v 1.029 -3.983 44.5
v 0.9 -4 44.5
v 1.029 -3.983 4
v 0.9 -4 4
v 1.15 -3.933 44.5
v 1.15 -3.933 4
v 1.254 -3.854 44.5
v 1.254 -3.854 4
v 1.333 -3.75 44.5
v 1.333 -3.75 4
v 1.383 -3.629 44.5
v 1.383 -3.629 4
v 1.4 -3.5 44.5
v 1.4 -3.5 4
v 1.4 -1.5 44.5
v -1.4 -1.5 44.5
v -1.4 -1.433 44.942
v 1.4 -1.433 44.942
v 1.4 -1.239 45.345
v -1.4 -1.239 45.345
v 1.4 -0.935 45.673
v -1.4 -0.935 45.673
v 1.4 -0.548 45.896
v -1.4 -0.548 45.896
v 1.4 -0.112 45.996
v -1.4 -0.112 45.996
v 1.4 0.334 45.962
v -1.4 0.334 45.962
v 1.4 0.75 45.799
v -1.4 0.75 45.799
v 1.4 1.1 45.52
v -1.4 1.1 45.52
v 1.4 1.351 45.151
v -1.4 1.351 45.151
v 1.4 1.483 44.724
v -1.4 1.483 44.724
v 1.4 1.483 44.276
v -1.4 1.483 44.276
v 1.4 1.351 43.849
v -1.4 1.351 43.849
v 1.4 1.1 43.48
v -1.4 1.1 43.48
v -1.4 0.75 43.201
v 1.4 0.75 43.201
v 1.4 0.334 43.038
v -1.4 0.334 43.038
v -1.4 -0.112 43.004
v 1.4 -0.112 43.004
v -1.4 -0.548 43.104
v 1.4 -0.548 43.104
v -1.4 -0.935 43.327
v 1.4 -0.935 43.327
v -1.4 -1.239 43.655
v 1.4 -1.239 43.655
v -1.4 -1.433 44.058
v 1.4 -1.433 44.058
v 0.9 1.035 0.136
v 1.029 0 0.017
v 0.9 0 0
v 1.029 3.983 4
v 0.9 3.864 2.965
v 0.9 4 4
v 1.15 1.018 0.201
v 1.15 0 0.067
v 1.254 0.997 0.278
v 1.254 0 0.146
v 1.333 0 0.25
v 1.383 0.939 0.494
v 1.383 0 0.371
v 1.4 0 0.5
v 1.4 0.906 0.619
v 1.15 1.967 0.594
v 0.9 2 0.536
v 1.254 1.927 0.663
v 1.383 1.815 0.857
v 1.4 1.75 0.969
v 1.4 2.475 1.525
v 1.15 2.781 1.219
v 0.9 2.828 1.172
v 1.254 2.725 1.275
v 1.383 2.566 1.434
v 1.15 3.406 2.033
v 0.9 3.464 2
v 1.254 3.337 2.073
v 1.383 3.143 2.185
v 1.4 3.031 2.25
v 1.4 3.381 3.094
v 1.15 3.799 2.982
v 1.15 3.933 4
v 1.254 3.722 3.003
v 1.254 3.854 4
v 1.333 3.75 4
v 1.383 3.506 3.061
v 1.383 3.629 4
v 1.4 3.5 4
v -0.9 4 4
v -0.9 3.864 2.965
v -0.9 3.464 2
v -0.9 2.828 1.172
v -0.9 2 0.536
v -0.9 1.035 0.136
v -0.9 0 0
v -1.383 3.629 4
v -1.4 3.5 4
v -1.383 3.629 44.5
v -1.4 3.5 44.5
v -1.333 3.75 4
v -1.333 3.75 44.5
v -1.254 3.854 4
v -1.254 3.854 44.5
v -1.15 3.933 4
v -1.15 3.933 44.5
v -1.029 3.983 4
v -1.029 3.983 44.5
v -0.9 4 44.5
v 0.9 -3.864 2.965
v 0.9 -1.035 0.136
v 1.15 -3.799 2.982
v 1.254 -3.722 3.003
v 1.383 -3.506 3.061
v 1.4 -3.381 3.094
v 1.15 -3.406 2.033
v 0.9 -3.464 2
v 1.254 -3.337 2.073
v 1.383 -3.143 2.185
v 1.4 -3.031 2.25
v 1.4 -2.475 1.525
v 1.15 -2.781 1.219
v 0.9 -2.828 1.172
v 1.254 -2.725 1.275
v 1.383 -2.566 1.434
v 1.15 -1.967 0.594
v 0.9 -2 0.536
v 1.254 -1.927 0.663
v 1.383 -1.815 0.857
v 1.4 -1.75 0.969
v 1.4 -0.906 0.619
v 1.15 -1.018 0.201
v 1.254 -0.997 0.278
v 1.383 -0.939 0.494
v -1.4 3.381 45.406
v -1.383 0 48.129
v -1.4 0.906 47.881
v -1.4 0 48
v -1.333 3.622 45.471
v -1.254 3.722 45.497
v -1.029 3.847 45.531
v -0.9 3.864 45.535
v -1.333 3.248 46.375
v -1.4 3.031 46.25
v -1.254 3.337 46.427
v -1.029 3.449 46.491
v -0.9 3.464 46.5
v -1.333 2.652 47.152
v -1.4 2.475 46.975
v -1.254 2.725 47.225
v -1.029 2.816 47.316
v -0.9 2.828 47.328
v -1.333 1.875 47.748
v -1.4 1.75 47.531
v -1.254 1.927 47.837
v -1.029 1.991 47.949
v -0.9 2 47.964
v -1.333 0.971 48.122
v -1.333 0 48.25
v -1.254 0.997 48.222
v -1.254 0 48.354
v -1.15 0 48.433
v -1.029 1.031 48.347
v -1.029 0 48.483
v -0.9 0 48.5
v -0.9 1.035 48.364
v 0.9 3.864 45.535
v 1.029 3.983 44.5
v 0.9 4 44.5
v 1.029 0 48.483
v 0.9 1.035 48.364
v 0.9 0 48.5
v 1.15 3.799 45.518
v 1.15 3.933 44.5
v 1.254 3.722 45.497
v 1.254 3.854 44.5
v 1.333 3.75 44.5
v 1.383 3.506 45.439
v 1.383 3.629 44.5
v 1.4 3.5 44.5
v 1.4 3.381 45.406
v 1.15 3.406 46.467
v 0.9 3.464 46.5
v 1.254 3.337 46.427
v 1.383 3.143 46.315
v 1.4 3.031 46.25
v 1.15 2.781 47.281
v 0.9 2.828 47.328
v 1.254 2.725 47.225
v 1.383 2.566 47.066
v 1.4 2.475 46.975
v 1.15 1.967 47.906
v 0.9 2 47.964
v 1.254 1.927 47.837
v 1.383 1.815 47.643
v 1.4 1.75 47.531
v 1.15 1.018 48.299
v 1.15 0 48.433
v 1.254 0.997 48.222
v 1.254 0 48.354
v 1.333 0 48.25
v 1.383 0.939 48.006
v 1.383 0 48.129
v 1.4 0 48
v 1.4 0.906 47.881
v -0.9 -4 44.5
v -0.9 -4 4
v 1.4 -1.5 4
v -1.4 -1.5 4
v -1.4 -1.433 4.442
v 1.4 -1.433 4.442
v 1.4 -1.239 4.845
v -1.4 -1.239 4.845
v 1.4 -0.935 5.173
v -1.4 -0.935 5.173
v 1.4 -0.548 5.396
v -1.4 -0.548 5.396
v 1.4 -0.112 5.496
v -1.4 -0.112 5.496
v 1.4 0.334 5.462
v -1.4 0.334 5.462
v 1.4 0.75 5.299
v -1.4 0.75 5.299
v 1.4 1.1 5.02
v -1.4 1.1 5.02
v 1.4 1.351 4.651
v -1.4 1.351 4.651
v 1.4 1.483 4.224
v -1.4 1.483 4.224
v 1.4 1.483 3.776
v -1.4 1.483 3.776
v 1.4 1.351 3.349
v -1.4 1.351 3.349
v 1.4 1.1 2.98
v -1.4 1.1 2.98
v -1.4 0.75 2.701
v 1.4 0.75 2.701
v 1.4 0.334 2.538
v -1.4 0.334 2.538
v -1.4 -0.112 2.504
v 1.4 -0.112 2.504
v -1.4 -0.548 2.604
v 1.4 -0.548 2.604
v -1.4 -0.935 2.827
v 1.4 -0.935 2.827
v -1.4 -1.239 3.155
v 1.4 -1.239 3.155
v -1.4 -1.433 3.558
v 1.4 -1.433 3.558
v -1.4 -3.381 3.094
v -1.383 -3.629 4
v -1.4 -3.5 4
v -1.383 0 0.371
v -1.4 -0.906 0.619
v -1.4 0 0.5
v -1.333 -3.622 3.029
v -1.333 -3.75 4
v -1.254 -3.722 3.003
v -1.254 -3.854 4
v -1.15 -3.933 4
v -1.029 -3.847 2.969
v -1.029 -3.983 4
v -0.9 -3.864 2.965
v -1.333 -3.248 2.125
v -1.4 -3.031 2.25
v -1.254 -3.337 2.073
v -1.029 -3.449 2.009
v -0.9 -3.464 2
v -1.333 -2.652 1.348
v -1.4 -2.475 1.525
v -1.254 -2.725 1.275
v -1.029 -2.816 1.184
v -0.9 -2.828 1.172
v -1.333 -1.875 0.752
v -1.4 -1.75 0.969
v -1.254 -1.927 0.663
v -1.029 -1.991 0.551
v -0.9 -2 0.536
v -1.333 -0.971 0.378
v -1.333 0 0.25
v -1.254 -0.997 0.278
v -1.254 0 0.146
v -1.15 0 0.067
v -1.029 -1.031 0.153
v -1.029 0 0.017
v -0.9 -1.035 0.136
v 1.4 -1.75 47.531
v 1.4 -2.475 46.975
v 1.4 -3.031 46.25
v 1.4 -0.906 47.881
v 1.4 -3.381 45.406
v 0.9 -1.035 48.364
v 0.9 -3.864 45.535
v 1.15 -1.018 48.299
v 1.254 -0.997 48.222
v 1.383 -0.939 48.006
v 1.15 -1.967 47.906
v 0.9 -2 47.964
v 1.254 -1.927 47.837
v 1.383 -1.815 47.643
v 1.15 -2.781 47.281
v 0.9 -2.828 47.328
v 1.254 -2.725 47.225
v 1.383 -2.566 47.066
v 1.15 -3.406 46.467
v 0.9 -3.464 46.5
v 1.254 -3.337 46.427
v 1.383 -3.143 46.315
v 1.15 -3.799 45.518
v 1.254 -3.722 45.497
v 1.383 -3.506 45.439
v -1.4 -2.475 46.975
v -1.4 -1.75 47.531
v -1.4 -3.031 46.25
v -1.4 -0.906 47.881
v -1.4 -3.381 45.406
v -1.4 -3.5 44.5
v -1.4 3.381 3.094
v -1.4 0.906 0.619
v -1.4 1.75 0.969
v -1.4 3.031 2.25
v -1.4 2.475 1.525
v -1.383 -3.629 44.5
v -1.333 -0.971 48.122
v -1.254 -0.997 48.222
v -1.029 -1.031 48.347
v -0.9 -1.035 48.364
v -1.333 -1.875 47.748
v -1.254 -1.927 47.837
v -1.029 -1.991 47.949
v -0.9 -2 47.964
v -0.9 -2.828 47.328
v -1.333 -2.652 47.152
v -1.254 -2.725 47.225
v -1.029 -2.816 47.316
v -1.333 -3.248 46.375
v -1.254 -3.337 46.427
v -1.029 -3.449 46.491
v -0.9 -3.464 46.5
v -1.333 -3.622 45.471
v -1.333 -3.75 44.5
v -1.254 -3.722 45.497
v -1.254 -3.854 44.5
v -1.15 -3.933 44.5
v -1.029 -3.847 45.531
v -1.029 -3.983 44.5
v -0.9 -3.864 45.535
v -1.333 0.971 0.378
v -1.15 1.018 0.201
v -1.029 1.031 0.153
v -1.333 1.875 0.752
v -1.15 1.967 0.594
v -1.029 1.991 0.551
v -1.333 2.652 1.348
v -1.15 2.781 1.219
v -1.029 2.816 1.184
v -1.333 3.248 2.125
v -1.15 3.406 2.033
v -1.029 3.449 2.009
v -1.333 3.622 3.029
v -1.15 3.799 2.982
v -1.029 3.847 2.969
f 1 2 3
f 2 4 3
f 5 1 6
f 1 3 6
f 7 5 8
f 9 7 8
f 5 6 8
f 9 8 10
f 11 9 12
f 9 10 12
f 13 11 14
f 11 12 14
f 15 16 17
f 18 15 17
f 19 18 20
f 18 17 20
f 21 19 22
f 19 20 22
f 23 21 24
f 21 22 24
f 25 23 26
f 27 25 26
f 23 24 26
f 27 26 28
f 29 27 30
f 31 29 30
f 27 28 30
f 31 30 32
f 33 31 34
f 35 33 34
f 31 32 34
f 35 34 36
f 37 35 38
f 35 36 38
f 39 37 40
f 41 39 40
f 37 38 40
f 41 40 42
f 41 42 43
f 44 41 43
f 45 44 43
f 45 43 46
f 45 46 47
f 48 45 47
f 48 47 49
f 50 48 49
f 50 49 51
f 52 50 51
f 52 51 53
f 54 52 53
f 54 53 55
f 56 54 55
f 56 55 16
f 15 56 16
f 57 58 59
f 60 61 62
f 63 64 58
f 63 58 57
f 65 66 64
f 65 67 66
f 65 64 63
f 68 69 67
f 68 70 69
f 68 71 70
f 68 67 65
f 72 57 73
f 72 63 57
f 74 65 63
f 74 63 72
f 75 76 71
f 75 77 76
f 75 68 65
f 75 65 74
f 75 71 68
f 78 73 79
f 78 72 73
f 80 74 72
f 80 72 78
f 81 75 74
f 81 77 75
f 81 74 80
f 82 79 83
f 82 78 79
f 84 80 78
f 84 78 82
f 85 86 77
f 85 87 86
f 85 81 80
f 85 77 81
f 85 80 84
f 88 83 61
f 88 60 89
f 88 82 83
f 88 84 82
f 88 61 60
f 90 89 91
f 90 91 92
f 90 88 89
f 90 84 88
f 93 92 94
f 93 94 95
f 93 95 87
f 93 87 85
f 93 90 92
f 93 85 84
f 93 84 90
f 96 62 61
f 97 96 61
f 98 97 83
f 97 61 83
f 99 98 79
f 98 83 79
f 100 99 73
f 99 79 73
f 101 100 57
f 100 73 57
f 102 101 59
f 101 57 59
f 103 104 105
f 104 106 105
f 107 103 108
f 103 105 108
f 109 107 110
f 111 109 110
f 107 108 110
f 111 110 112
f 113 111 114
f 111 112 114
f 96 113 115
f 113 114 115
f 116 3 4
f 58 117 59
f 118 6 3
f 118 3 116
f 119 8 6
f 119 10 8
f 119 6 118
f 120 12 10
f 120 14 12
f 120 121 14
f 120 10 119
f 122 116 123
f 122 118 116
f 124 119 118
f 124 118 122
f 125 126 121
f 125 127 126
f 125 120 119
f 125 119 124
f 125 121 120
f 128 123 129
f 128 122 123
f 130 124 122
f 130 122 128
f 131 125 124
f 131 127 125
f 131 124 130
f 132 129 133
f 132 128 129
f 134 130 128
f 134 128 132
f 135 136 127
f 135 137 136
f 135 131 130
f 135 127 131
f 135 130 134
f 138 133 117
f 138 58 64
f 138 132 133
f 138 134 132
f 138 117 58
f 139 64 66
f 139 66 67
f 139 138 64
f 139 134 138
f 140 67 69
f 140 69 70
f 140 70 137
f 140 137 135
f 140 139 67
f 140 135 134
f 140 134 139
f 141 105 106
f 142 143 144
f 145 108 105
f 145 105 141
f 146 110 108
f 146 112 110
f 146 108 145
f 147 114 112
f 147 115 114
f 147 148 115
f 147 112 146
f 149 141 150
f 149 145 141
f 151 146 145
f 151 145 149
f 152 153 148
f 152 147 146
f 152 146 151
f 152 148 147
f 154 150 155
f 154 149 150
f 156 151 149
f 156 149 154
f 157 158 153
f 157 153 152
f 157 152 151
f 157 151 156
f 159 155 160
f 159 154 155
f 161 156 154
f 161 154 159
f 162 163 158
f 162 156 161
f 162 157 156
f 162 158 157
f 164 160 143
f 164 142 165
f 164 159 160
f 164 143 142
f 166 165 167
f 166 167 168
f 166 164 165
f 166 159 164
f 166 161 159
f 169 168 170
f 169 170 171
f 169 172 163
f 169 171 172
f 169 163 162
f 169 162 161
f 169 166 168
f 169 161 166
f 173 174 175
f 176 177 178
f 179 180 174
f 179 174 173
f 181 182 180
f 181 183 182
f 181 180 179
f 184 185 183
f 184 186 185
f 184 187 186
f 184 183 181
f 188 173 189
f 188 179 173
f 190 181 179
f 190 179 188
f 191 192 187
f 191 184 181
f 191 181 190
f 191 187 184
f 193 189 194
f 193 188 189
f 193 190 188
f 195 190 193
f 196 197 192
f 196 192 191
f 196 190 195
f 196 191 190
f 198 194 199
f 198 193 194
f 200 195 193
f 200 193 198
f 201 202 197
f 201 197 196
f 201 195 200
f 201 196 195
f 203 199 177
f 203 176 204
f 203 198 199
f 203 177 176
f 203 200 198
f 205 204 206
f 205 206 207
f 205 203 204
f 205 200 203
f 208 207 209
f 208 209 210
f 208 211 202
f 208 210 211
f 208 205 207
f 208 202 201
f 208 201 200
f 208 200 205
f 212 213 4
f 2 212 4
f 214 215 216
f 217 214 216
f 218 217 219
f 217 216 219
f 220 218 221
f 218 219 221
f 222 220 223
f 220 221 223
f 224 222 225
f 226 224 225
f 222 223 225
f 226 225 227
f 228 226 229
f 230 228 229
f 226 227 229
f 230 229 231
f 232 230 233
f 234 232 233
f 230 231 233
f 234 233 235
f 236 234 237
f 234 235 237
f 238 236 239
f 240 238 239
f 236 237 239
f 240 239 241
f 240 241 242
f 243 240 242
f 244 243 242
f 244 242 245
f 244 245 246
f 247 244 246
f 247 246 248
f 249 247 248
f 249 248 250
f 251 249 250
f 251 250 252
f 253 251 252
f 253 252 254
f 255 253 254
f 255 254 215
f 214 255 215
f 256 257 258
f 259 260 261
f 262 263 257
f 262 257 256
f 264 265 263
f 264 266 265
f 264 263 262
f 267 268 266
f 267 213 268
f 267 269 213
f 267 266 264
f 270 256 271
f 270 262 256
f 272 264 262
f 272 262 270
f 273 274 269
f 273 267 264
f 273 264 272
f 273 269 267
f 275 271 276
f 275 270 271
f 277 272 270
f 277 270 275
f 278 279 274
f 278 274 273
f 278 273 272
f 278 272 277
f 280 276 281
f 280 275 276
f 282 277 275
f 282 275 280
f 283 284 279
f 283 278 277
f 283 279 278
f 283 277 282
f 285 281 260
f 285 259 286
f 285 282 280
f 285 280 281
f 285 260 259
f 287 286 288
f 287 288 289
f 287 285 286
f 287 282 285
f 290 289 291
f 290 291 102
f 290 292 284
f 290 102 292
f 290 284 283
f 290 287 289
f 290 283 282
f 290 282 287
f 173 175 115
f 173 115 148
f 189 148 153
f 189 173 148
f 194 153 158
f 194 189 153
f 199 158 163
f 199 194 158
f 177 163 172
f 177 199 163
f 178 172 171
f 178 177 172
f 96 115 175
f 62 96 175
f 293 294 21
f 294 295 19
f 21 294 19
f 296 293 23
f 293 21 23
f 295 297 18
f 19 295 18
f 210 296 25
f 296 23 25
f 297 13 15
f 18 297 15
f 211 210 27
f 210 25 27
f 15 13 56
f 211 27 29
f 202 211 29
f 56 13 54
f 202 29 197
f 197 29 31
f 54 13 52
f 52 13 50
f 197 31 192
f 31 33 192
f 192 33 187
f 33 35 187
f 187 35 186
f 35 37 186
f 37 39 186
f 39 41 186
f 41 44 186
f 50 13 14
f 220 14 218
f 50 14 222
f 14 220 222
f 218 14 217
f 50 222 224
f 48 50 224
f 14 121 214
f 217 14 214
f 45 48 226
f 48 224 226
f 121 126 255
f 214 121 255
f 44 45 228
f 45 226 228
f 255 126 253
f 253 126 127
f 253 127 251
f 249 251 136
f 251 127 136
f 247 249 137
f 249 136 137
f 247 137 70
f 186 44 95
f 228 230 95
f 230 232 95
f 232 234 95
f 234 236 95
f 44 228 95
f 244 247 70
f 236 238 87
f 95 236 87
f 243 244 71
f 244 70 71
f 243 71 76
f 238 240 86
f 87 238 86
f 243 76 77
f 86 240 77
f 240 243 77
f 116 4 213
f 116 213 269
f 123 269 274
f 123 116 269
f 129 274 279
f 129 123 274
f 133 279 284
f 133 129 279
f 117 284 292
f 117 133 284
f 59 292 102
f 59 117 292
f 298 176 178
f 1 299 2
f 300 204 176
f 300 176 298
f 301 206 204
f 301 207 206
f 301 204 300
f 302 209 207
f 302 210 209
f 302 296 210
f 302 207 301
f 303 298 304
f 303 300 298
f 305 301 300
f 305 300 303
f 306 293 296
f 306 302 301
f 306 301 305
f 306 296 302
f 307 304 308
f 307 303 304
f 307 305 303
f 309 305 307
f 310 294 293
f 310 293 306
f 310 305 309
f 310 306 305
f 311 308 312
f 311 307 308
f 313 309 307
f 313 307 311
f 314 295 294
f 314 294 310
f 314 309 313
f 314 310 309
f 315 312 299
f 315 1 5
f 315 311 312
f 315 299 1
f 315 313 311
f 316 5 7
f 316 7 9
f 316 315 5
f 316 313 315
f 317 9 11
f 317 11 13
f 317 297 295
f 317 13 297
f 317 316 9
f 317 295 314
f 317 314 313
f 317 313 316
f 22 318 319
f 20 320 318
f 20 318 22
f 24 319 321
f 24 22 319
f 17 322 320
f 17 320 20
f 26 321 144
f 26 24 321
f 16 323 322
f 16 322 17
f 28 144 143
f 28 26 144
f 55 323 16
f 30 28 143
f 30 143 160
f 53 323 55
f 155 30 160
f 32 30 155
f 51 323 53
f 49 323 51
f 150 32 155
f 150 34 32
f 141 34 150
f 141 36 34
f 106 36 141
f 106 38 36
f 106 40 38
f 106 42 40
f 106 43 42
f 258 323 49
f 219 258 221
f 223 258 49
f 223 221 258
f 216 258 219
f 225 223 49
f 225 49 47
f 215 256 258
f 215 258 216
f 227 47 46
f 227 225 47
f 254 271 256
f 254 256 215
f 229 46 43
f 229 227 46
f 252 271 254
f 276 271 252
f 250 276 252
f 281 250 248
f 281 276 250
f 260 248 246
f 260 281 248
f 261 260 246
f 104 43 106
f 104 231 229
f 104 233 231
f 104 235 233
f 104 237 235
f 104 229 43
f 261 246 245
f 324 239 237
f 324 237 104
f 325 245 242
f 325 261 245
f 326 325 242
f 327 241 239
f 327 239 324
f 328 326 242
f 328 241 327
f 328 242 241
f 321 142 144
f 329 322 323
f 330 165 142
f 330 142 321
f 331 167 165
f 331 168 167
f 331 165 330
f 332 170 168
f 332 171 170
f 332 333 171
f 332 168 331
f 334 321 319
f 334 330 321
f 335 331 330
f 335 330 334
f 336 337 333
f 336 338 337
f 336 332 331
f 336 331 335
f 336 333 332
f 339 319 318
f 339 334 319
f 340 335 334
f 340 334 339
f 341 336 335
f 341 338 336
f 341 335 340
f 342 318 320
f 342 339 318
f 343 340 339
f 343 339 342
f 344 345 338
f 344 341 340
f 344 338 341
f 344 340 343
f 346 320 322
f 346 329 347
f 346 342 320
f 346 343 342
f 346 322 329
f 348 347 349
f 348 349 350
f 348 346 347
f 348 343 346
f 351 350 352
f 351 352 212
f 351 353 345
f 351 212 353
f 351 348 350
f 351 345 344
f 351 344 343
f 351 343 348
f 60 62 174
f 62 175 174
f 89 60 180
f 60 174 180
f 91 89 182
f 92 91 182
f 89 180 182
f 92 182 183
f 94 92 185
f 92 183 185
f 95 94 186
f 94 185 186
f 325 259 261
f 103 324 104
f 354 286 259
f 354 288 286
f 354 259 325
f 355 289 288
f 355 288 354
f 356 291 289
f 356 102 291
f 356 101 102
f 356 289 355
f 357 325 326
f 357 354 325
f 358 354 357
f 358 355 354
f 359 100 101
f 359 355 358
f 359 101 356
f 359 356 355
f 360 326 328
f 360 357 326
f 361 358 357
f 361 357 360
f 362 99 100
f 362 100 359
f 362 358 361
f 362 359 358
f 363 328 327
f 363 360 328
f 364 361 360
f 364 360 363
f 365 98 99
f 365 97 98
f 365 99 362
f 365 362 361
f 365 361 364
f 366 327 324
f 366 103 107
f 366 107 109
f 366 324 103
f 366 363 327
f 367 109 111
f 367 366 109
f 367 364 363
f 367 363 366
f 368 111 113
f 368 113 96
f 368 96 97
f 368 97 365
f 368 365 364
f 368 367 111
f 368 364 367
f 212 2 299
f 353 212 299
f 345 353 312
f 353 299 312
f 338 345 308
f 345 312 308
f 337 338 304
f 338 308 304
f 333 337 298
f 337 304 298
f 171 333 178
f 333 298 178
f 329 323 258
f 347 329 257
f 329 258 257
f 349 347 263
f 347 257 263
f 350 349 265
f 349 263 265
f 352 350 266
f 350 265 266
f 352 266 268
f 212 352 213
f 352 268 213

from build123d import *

# Parameters (mm, degrees)
F0_W     = 2.8
F0_H     = 8
F1_DEPTH = 48.5
F2_R     = 3.99999
F3_R     = 1.5
F4_DEPTH = 5
F5_R     = 0.5


# Not quite as in the source:
# - a fillet or chamfer is up to 0.001 mm smaller than in the source, because OpenCascade refuses the exact size


with BuildPart() as f1:
    # F0 (on Top) → F1 (new body)
    with BuildSketch(Plane.XY):
        Rectangle(F0_W, F0_H)
    extrude(amount=F1_DEPTH)

    # F2 (radius 4 in the source; OpenCascade refuses exactly that, so slightly less here)
    f2_edges = [f1.edges().sort_by_distance(p)[0] for p in [
        (0, 4, 0),
        (0, -4, 0),
        (0, -4, 48.5),
        (0, 4, 48.5),
    ]]
    fillet(f2_edges, radius=F2_R)

    # F3 (on face) → F4 (cut)
    with BuildSketch(Plane(origin=(-1.4, 0, 0), x_dir=(0, -1, 0), z_dir=(-1, 0, 0))):
        with Locations((0, 4)):
            Circle(F3_R)
        with Locations((0, 44.5)):
            Circle(F3_R)
    extrude(amount=-F4_DEPTH, mode=Mode.SUBTRACT)

    # F5
    f5_edges = [f1.edges().sort_by_distance(p)[0] for p in [
        (-1.4, 4, 24.25),
        (1.4, 4, 24.25),
    ]]
    fillet(f5_edges, radius=F5_R)


solid = f1.part
